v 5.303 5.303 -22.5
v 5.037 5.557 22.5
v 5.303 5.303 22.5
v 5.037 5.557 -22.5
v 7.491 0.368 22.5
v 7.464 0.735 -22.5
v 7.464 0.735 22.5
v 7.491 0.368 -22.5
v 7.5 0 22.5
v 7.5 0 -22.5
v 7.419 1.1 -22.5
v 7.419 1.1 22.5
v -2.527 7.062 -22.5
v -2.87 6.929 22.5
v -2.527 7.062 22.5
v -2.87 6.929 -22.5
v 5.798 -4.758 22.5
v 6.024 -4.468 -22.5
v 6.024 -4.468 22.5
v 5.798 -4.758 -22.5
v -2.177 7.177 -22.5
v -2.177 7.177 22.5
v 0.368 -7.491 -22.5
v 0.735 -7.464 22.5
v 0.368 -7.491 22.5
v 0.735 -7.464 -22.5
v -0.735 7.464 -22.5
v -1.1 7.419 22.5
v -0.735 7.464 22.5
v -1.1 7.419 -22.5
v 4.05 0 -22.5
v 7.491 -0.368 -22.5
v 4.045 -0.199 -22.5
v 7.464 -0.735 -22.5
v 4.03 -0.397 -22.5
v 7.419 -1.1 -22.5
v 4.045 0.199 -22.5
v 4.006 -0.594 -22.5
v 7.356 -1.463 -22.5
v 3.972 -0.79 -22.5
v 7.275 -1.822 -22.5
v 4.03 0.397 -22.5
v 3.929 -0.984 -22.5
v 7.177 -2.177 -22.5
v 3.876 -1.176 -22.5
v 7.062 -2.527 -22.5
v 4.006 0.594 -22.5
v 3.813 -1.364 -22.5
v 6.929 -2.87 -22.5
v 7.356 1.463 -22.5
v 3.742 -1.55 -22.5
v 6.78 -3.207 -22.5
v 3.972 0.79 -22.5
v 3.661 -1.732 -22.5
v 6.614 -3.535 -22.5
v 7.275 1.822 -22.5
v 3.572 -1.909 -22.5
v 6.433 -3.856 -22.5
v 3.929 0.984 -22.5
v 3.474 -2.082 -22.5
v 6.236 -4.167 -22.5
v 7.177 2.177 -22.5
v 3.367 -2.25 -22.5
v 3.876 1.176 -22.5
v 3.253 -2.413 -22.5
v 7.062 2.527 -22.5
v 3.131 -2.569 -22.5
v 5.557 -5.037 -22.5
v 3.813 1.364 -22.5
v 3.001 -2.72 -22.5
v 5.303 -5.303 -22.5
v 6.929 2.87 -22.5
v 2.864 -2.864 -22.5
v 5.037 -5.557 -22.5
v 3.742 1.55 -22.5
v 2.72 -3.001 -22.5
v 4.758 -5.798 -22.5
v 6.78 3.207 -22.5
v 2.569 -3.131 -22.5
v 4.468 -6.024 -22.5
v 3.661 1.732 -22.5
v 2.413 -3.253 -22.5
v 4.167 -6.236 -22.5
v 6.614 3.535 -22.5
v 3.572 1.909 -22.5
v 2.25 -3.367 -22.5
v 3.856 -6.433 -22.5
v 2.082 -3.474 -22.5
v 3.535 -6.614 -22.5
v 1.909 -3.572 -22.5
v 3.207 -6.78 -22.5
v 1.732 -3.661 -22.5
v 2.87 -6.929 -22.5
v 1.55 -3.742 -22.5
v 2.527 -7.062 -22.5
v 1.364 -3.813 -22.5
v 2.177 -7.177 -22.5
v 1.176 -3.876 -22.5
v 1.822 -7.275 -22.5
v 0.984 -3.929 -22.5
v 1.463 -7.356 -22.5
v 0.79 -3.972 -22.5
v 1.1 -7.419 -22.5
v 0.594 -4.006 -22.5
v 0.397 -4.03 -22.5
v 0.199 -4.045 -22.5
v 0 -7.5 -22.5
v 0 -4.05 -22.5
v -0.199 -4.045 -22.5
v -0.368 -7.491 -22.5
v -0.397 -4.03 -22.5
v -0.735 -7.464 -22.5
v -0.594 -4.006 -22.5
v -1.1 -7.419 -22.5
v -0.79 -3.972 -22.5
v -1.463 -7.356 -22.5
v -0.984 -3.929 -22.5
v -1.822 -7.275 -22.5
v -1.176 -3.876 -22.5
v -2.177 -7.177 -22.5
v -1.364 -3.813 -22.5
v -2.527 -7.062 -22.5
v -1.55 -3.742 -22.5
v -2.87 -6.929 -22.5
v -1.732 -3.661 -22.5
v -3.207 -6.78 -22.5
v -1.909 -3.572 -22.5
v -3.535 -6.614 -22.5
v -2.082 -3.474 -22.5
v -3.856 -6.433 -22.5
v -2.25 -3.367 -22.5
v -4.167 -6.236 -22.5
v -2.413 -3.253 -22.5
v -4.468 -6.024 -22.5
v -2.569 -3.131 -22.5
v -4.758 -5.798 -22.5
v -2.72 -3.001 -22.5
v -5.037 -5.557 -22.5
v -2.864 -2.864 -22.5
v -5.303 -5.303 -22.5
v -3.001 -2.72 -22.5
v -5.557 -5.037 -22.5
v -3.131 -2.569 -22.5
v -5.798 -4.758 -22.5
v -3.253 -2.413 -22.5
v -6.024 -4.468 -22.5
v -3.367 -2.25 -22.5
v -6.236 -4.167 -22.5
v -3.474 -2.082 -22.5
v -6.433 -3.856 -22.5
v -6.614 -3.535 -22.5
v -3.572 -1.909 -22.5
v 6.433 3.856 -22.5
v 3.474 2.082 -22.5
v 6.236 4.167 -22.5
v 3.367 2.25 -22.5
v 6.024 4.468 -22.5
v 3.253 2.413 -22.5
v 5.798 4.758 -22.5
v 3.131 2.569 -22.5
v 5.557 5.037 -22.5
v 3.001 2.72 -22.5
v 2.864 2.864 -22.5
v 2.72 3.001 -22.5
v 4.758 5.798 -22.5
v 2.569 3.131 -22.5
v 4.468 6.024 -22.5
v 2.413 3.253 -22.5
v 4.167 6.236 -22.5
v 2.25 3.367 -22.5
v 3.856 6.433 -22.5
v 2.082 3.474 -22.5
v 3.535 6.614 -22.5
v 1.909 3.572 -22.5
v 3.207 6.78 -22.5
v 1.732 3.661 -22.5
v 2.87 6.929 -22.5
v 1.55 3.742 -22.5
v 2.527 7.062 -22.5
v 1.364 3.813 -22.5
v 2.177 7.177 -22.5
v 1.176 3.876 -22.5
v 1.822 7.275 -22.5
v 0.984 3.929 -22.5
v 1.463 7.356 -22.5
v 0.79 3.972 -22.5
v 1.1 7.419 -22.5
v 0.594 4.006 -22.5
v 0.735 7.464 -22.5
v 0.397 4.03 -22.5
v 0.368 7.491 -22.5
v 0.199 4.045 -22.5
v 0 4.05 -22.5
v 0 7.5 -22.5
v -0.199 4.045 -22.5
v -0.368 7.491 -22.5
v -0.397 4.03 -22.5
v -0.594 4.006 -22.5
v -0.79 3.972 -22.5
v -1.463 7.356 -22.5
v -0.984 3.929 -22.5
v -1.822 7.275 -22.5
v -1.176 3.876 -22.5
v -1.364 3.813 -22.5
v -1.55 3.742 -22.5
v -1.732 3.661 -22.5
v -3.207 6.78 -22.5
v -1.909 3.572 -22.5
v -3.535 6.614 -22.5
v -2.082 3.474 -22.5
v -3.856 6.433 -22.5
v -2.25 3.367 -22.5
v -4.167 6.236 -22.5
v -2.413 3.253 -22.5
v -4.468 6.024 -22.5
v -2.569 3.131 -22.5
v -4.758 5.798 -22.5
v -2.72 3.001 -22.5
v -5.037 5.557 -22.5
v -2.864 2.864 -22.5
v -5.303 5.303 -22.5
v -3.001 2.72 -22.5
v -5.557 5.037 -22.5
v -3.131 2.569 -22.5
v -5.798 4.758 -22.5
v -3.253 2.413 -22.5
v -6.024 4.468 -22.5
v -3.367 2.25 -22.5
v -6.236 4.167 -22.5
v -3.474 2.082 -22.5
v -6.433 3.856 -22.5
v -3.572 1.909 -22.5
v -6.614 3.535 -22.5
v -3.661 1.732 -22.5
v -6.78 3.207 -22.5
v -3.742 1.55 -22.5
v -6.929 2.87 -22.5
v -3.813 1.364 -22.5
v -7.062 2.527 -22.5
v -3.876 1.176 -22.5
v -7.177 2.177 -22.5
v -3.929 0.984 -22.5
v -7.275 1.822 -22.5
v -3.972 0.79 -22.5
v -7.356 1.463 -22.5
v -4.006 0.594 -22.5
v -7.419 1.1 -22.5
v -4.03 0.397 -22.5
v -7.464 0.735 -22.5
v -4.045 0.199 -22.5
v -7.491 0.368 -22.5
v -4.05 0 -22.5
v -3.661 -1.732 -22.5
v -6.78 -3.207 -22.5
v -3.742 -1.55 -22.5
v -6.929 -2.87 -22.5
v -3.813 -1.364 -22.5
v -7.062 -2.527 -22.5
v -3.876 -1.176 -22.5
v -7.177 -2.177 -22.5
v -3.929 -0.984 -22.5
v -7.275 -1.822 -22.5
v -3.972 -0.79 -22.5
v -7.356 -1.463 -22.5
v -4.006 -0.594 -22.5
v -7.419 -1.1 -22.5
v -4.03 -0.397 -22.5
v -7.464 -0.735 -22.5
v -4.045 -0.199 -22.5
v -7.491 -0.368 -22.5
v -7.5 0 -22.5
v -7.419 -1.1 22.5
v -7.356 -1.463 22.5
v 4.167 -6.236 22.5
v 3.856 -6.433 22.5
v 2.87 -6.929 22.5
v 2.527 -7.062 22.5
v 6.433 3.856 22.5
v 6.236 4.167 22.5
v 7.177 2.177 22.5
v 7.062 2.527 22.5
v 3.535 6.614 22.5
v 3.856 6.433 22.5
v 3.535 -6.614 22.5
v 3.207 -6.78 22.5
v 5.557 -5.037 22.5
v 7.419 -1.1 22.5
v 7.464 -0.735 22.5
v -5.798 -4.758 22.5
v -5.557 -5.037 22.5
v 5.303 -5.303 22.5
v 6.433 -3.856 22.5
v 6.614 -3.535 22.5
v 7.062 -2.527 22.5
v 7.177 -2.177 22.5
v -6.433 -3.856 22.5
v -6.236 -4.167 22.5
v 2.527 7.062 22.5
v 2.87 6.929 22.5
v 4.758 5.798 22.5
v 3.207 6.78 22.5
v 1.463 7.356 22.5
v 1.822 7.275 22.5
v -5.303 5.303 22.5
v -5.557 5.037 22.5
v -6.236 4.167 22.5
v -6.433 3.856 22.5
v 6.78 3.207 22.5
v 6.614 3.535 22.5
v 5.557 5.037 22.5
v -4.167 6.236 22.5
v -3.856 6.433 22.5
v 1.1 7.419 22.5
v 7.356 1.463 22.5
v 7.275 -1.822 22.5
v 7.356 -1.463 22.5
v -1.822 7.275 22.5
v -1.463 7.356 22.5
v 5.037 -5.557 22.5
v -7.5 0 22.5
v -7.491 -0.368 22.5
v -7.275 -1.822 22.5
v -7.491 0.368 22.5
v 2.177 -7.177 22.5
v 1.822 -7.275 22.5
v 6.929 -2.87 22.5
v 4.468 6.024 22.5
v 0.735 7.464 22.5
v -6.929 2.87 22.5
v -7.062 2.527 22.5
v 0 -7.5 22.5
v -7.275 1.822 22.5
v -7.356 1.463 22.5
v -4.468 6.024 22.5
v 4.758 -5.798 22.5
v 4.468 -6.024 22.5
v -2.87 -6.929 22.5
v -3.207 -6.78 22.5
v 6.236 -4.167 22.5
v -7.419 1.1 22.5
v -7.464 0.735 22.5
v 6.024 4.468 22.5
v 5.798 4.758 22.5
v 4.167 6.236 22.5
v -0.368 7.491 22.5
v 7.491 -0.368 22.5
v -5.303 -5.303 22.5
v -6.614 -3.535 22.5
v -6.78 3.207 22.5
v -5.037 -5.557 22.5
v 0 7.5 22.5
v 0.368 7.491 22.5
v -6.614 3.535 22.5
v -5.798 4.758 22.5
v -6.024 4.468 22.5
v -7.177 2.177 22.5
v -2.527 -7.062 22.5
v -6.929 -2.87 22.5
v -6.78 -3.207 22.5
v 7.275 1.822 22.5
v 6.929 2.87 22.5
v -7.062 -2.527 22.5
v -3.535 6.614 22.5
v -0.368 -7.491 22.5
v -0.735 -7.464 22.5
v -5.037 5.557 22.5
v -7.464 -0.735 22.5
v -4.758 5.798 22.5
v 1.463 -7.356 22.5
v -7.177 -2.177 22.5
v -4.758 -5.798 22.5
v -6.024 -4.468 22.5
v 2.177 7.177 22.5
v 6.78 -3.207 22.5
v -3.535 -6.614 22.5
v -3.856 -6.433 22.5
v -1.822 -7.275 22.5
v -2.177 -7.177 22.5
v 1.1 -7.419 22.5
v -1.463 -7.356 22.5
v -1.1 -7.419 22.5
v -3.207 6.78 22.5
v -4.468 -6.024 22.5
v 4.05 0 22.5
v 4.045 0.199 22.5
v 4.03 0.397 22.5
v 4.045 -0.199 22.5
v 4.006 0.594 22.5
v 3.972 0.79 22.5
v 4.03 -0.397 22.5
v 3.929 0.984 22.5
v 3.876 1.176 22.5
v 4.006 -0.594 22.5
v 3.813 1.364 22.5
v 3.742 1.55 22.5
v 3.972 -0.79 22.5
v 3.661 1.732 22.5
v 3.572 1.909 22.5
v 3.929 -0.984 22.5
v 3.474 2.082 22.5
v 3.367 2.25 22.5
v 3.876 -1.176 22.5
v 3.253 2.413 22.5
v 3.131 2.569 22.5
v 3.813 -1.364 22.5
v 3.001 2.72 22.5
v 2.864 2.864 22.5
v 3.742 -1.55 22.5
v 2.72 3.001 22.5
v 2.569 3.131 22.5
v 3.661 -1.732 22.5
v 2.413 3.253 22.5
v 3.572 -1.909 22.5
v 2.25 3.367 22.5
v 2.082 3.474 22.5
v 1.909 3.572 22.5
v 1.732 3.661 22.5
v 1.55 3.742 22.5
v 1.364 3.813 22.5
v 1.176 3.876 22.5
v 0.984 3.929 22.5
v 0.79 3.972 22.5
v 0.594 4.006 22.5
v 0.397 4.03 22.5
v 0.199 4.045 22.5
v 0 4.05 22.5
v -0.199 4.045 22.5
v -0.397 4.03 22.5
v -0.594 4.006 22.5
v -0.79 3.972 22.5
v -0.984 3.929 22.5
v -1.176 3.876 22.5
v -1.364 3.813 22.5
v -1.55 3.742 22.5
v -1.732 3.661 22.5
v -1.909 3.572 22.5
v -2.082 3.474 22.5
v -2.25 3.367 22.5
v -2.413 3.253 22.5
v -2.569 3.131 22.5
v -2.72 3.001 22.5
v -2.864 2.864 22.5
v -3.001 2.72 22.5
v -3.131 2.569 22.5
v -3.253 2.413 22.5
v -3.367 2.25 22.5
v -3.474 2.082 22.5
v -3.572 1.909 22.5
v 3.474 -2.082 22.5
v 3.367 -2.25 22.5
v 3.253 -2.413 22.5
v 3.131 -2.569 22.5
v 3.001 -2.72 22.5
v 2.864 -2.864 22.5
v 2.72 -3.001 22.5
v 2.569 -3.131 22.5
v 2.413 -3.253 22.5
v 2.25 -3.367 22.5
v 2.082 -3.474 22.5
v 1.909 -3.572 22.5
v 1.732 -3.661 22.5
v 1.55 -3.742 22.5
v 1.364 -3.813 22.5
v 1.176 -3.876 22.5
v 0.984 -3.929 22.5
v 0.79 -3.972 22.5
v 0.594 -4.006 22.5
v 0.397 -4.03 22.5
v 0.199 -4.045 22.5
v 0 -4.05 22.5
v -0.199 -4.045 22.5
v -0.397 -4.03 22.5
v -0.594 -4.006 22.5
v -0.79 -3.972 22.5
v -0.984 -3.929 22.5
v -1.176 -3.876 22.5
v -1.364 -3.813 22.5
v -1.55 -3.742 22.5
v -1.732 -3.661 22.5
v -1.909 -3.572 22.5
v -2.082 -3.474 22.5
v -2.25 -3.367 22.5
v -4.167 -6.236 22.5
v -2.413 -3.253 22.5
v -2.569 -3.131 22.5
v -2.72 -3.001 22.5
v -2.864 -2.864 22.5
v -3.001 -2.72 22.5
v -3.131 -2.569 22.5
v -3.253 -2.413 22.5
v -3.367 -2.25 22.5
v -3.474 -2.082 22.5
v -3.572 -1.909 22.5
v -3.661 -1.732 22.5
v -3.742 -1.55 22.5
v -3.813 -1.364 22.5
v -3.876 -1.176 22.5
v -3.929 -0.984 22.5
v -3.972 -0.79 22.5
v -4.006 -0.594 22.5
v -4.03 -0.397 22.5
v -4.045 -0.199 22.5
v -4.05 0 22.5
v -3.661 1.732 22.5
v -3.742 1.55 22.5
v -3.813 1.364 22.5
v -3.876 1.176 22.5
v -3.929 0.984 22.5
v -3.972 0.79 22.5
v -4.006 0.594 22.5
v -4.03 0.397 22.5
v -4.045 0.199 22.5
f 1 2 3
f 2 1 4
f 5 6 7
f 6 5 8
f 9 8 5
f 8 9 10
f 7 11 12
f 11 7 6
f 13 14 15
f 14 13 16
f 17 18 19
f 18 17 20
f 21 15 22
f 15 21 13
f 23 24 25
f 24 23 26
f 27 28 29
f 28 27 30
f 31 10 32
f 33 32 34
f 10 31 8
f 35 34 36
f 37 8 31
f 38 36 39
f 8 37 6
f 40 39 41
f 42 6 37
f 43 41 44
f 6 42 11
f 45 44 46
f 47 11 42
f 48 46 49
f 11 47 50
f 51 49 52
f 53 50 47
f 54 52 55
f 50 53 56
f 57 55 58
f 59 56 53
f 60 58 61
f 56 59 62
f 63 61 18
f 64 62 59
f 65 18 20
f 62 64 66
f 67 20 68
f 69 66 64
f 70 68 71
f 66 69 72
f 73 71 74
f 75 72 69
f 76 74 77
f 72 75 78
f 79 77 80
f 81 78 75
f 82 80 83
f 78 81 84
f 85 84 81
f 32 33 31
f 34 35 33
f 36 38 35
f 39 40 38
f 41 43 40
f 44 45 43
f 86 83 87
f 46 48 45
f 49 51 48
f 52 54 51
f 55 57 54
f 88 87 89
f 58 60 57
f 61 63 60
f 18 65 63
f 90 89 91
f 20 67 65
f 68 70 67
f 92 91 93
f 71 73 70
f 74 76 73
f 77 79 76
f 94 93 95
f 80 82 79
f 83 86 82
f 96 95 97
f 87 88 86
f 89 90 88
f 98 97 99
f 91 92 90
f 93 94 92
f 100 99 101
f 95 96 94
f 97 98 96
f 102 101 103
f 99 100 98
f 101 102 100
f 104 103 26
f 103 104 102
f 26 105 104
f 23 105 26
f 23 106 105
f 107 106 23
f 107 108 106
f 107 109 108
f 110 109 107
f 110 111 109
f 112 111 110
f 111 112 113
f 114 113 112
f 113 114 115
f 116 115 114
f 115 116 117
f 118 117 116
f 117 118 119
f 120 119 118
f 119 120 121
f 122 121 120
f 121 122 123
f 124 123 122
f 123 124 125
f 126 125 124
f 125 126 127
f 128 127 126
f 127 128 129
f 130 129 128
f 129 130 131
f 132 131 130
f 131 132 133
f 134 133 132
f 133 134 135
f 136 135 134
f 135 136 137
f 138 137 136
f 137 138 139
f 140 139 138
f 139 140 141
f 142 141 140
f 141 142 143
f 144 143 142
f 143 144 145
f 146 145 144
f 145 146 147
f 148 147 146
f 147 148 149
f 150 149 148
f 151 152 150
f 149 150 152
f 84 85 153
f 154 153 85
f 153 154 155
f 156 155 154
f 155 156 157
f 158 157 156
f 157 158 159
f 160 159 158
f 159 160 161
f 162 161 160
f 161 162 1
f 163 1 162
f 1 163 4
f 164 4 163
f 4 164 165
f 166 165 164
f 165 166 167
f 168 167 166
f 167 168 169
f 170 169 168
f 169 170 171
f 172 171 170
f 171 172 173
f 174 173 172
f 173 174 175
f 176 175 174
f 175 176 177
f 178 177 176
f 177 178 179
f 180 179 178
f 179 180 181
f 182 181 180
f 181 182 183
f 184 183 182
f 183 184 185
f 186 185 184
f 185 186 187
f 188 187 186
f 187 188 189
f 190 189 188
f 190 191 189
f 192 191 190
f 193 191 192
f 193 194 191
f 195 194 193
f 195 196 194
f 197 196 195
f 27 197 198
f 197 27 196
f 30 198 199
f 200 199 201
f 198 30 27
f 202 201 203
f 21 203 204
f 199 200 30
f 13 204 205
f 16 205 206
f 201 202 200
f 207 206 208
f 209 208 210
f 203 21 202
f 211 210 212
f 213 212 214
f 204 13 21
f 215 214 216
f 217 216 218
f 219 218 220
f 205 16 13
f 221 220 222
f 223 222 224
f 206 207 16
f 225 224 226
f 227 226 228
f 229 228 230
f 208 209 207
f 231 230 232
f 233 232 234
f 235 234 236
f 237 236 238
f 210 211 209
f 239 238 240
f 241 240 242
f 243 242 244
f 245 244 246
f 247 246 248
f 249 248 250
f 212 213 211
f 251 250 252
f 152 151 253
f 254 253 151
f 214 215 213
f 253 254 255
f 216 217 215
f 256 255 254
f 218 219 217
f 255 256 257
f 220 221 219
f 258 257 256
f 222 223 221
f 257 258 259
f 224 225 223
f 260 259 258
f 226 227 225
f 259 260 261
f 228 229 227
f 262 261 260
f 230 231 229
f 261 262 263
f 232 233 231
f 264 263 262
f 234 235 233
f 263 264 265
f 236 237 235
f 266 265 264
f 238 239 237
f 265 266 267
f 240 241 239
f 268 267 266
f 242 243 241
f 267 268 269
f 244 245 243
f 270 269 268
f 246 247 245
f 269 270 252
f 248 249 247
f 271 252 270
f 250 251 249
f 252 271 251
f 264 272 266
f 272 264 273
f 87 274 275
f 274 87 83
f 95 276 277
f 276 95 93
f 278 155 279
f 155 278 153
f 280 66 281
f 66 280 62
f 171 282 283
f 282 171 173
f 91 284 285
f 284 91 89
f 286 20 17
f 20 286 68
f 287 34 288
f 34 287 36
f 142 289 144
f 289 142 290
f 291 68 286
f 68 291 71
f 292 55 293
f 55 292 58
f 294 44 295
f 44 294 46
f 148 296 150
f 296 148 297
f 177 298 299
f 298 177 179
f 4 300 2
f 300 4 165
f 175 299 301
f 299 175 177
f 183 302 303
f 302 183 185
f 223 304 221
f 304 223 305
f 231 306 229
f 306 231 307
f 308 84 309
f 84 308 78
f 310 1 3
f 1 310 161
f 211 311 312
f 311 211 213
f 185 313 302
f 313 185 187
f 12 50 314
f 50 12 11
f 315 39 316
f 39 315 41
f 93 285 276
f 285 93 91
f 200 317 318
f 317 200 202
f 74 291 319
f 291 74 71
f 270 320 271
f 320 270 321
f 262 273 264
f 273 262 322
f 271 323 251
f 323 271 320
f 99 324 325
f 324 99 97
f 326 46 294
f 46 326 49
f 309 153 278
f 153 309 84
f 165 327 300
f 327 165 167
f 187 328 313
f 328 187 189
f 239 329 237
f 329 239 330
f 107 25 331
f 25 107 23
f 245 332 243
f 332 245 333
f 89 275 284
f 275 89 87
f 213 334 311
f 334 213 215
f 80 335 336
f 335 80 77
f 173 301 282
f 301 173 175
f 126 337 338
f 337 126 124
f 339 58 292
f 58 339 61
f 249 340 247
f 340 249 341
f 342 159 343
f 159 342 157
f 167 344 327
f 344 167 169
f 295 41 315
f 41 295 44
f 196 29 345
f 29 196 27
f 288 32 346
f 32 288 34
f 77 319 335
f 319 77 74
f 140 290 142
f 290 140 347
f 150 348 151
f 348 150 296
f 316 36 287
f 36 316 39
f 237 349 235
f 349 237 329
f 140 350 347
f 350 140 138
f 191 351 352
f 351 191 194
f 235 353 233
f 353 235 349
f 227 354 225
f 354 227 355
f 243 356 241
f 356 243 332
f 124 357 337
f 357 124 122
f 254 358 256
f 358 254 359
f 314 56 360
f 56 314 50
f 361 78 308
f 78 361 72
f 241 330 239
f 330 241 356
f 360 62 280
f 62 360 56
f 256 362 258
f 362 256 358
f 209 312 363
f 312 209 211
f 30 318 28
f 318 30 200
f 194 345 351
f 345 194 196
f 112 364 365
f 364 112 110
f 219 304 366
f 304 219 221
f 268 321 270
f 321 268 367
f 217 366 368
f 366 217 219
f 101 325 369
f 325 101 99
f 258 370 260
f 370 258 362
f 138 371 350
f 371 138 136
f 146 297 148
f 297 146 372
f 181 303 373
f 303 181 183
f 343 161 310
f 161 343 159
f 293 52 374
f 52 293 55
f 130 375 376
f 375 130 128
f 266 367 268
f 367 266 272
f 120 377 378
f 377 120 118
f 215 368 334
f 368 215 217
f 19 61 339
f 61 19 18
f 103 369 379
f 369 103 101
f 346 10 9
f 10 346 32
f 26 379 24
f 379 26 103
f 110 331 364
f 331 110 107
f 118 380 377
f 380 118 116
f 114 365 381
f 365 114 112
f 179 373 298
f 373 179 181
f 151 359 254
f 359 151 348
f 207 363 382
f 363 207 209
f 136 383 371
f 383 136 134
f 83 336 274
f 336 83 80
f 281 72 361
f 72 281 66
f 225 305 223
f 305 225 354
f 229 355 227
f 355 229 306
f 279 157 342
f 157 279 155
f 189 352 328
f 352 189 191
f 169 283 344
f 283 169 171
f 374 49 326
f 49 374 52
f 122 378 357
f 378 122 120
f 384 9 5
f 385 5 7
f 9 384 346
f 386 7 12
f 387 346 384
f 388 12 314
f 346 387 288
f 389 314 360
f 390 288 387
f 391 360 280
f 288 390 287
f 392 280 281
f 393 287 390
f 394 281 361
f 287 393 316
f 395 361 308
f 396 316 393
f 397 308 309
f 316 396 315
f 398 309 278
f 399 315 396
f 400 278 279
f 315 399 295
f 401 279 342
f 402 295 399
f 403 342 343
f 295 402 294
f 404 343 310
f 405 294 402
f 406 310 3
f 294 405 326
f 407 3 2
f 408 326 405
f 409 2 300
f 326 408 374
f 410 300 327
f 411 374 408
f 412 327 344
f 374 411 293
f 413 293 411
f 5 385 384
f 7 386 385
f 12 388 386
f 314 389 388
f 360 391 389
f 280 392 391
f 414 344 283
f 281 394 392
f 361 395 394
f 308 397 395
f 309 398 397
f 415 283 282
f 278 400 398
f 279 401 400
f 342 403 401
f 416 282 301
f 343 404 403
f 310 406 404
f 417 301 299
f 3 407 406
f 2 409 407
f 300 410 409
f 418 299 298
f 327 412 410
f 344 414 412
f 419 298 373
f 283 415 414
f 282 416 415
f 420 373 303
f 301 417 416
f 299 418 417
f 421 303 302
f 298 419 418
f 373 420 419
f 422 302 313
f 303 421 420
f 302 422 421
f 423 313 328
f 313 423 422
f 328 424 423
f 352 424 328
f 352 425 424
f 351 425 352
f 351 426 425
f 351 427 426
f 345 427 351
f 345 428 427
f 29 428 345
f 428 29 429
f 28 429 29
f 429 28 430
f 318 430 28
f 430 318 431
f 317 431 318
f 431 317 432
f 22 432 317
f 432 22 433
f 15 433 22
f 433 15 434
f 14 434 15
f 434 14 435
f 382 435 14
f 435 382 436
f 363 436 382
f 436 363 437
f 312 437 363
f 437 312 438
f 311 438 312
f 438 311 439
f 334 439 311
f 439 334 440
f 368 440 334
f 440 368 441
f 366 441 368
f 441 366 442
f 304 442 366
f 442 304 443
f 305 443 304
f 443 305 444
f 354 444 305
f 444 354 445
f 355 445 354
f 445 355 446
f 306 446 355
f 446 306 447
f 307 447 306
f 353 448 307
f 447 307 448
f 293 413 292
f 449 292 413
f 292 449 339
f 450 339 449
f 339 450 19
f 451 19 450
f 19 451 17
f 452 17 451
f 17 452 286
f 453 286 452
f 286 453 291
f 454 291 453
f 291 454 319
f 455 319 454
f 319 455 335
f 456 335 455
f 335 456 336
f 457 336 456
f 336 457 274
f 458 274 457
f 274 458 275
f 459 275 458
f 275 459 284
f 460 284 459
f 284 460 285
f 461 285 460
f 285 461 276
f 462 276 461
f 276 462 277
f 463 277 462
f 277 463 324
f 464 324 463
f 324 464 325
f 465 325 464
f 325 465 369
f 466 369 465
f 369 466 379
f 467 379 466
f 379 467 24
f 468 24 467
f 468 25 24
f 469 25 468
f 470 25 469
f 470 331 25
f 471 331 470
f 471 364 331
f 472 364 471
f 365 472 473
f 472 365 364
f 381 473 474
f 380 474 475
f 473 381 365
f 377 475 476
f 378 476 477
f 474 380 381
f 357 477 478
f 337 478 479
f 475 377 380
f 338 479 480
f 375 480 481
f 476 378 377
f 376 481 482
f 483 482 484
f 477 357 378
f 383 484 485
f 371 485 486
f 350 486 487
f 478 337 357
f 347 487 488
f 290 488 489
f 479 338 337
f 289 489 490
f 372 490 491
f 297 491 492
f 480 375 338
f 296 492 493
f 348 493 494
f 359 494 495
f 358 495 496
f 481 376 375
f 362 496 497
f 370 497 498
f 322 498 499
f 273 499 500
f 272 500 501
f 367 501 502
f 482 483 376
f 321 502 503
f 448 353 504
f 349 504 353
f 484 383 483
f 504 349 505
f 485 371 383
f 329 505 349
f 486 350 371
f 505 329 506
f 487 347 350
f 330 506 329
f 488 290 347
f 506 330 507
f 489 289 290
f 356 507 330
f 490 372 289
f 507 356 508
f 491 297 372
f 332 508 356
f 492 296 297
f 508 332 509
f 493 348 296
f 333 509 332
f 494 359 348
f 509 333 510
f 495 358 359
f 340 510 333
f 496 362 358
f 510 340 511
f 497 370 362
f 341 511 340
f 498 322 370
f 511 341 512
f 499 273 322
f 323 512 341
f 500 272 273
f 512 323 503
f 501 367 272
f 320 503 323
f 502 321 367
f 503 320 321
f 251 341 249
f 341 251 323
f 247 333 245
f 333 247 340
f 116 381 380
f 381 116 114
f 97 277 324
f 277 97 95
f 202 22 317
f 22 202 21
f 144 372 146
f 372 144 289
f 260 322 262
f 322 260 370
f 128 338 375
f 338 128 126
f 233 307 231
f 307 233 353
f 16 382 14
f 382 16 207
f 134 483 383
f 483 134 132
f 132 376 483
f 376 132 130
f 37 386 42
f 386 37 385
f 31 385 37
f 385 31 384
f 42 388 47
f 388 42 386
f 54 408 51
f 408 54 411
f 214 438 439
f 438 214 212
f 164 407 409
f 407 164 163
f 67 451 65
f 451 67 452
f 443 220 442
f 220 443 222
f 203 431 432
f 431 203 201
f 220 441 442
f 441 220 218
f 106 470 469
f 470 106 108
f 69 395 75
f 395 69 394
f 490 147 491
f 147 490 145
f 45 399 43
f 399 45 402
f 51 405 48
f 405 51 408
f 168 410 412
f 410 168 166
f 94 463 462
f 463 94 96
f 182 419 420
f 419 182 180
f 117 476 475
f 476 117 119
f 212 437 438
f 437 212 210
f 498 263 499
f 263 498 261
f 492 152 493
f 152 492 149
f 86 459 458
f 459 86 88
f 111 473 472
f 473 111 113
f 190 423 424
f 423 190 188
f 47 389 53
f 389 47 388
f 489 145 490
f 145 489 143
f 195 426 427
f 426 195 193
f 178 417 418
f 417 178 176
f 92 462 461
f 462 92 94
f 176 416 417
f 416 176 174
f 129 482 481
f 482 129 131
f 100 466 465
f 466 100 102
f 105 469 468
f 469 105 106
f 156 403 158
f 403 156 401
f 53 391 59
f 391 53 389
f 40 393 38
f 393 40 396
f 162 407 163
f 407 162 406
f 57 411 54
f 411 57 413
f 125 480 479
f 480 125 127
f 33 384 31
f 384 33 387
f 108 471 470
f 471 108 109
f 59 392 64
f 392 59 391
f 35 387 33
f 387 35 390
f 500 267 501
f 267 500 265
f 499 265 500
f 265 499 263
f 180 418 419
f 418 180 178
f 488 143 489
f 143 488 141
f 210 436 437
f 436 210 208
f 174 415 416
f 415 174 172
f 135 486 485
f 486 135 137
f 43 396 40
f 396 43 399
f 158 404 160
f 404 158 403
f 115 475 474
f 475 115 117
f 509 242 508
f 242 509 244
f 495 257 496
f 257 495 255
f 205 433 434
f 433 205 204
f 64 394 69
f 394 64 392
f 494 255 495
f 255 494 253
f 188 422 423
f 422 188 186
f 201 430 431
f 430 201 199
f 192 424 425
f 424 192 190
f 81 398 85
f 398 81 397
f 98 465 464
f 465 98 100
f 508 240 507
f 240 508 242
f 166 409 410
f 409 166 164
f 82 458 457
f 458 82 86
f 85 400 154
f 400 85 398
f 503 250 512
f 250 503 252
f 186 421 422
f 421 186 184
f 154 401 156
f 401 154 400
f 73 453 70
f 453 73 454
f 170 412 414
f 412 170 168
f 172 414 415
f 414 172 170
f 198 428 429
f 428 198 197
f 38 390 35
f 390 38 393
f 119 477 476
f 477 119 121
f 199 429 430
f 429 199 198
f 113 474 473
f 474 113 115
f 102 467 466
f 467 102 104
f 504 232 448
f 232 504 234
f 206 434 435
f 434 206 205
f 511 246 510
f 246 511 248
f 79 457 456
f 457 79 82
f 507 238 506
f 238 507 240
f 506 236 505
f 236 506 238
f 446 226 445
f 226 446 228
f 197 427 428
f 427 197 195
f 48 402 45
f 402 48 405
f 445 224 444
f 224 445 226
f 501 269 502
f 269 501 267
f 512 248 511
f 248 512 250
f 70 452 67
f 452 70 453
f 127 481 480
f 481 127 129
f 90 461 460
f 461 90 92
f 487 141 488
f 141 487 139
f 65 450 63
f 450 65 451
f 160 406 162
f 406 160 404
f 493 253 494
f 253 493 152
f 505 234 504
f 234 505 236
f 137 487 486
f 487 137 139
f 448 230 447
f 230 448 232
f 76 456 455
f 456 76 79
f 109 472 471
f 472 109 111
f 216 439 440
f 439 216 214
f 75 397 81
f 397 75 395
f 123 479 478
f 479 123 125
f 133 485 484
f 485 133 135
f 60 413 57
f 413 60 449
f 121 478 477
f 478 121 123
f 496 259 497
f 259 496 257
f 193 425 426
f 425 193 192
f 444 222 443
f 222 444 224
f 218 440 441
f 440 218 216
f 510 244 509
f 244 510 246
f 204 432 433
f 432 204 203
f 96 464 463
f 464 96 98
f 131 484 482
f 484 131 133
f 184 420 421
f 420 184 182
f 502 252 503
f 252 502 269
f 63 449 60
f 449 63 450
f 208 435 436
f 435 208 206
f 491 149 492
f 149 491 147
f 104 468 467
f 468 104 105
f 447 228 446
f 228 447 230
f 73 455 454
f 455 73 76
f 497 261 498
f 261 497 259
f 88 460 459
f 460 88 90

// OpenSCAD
// Long linear bearing (single connected solid)
// Target: 8.0mm bore, 15.0mm OD, 45.0mm length

$fn = 128;

// Key dimensions
bore_diameter_mm  = 8.0;   // through-bore
outer_diameter_mm = 15.0;  // outer diameter
length_mm         = 45.0;  // overall length

// Optional detailing
bore_clearance_mm = 0.10;  // small clearance on bore
end_chamfer_mm    = 0.60;  // outer end chamfer size
eps_mm            = 0.02;

module long_linear_bearing() {
    r_out = outer_diameter_mm/2;
    r_in  = (bore_diameter_mm + bore_clearance_mm)/2;

    // Outer body with simple end chamfers, and a true through-bore
    difference() {
        // Outer shape (connected single body)
        union() {
            // Main cylinder
            cylinder(r=r_out, h=length_mm, center=true);

            // Add slight end chamfer volumes (then subtract inner to keep bore clean)
            // Implemented by adding short frustums at both ends
            translate([0, 0,  length_mm/2 - end_chamfer_mm/2])
                cylinder(r1=r_out - end_chamfer_mm, r2=r_out, h=end_chamfer_mm, center=true);
            translate([0, 0, -length_mm/2 + end_chamfer_mm/2])
                cylinder(r1=r_out, r2=r_out - end_chamfer_mm, h=end_chamfer_mm, center=true);
        }

        // Through bore along full length
        cylinder(r=r_in, h=length_mm + 2*eps_mm, center=true);
    }
}

long_linear_bearing();
